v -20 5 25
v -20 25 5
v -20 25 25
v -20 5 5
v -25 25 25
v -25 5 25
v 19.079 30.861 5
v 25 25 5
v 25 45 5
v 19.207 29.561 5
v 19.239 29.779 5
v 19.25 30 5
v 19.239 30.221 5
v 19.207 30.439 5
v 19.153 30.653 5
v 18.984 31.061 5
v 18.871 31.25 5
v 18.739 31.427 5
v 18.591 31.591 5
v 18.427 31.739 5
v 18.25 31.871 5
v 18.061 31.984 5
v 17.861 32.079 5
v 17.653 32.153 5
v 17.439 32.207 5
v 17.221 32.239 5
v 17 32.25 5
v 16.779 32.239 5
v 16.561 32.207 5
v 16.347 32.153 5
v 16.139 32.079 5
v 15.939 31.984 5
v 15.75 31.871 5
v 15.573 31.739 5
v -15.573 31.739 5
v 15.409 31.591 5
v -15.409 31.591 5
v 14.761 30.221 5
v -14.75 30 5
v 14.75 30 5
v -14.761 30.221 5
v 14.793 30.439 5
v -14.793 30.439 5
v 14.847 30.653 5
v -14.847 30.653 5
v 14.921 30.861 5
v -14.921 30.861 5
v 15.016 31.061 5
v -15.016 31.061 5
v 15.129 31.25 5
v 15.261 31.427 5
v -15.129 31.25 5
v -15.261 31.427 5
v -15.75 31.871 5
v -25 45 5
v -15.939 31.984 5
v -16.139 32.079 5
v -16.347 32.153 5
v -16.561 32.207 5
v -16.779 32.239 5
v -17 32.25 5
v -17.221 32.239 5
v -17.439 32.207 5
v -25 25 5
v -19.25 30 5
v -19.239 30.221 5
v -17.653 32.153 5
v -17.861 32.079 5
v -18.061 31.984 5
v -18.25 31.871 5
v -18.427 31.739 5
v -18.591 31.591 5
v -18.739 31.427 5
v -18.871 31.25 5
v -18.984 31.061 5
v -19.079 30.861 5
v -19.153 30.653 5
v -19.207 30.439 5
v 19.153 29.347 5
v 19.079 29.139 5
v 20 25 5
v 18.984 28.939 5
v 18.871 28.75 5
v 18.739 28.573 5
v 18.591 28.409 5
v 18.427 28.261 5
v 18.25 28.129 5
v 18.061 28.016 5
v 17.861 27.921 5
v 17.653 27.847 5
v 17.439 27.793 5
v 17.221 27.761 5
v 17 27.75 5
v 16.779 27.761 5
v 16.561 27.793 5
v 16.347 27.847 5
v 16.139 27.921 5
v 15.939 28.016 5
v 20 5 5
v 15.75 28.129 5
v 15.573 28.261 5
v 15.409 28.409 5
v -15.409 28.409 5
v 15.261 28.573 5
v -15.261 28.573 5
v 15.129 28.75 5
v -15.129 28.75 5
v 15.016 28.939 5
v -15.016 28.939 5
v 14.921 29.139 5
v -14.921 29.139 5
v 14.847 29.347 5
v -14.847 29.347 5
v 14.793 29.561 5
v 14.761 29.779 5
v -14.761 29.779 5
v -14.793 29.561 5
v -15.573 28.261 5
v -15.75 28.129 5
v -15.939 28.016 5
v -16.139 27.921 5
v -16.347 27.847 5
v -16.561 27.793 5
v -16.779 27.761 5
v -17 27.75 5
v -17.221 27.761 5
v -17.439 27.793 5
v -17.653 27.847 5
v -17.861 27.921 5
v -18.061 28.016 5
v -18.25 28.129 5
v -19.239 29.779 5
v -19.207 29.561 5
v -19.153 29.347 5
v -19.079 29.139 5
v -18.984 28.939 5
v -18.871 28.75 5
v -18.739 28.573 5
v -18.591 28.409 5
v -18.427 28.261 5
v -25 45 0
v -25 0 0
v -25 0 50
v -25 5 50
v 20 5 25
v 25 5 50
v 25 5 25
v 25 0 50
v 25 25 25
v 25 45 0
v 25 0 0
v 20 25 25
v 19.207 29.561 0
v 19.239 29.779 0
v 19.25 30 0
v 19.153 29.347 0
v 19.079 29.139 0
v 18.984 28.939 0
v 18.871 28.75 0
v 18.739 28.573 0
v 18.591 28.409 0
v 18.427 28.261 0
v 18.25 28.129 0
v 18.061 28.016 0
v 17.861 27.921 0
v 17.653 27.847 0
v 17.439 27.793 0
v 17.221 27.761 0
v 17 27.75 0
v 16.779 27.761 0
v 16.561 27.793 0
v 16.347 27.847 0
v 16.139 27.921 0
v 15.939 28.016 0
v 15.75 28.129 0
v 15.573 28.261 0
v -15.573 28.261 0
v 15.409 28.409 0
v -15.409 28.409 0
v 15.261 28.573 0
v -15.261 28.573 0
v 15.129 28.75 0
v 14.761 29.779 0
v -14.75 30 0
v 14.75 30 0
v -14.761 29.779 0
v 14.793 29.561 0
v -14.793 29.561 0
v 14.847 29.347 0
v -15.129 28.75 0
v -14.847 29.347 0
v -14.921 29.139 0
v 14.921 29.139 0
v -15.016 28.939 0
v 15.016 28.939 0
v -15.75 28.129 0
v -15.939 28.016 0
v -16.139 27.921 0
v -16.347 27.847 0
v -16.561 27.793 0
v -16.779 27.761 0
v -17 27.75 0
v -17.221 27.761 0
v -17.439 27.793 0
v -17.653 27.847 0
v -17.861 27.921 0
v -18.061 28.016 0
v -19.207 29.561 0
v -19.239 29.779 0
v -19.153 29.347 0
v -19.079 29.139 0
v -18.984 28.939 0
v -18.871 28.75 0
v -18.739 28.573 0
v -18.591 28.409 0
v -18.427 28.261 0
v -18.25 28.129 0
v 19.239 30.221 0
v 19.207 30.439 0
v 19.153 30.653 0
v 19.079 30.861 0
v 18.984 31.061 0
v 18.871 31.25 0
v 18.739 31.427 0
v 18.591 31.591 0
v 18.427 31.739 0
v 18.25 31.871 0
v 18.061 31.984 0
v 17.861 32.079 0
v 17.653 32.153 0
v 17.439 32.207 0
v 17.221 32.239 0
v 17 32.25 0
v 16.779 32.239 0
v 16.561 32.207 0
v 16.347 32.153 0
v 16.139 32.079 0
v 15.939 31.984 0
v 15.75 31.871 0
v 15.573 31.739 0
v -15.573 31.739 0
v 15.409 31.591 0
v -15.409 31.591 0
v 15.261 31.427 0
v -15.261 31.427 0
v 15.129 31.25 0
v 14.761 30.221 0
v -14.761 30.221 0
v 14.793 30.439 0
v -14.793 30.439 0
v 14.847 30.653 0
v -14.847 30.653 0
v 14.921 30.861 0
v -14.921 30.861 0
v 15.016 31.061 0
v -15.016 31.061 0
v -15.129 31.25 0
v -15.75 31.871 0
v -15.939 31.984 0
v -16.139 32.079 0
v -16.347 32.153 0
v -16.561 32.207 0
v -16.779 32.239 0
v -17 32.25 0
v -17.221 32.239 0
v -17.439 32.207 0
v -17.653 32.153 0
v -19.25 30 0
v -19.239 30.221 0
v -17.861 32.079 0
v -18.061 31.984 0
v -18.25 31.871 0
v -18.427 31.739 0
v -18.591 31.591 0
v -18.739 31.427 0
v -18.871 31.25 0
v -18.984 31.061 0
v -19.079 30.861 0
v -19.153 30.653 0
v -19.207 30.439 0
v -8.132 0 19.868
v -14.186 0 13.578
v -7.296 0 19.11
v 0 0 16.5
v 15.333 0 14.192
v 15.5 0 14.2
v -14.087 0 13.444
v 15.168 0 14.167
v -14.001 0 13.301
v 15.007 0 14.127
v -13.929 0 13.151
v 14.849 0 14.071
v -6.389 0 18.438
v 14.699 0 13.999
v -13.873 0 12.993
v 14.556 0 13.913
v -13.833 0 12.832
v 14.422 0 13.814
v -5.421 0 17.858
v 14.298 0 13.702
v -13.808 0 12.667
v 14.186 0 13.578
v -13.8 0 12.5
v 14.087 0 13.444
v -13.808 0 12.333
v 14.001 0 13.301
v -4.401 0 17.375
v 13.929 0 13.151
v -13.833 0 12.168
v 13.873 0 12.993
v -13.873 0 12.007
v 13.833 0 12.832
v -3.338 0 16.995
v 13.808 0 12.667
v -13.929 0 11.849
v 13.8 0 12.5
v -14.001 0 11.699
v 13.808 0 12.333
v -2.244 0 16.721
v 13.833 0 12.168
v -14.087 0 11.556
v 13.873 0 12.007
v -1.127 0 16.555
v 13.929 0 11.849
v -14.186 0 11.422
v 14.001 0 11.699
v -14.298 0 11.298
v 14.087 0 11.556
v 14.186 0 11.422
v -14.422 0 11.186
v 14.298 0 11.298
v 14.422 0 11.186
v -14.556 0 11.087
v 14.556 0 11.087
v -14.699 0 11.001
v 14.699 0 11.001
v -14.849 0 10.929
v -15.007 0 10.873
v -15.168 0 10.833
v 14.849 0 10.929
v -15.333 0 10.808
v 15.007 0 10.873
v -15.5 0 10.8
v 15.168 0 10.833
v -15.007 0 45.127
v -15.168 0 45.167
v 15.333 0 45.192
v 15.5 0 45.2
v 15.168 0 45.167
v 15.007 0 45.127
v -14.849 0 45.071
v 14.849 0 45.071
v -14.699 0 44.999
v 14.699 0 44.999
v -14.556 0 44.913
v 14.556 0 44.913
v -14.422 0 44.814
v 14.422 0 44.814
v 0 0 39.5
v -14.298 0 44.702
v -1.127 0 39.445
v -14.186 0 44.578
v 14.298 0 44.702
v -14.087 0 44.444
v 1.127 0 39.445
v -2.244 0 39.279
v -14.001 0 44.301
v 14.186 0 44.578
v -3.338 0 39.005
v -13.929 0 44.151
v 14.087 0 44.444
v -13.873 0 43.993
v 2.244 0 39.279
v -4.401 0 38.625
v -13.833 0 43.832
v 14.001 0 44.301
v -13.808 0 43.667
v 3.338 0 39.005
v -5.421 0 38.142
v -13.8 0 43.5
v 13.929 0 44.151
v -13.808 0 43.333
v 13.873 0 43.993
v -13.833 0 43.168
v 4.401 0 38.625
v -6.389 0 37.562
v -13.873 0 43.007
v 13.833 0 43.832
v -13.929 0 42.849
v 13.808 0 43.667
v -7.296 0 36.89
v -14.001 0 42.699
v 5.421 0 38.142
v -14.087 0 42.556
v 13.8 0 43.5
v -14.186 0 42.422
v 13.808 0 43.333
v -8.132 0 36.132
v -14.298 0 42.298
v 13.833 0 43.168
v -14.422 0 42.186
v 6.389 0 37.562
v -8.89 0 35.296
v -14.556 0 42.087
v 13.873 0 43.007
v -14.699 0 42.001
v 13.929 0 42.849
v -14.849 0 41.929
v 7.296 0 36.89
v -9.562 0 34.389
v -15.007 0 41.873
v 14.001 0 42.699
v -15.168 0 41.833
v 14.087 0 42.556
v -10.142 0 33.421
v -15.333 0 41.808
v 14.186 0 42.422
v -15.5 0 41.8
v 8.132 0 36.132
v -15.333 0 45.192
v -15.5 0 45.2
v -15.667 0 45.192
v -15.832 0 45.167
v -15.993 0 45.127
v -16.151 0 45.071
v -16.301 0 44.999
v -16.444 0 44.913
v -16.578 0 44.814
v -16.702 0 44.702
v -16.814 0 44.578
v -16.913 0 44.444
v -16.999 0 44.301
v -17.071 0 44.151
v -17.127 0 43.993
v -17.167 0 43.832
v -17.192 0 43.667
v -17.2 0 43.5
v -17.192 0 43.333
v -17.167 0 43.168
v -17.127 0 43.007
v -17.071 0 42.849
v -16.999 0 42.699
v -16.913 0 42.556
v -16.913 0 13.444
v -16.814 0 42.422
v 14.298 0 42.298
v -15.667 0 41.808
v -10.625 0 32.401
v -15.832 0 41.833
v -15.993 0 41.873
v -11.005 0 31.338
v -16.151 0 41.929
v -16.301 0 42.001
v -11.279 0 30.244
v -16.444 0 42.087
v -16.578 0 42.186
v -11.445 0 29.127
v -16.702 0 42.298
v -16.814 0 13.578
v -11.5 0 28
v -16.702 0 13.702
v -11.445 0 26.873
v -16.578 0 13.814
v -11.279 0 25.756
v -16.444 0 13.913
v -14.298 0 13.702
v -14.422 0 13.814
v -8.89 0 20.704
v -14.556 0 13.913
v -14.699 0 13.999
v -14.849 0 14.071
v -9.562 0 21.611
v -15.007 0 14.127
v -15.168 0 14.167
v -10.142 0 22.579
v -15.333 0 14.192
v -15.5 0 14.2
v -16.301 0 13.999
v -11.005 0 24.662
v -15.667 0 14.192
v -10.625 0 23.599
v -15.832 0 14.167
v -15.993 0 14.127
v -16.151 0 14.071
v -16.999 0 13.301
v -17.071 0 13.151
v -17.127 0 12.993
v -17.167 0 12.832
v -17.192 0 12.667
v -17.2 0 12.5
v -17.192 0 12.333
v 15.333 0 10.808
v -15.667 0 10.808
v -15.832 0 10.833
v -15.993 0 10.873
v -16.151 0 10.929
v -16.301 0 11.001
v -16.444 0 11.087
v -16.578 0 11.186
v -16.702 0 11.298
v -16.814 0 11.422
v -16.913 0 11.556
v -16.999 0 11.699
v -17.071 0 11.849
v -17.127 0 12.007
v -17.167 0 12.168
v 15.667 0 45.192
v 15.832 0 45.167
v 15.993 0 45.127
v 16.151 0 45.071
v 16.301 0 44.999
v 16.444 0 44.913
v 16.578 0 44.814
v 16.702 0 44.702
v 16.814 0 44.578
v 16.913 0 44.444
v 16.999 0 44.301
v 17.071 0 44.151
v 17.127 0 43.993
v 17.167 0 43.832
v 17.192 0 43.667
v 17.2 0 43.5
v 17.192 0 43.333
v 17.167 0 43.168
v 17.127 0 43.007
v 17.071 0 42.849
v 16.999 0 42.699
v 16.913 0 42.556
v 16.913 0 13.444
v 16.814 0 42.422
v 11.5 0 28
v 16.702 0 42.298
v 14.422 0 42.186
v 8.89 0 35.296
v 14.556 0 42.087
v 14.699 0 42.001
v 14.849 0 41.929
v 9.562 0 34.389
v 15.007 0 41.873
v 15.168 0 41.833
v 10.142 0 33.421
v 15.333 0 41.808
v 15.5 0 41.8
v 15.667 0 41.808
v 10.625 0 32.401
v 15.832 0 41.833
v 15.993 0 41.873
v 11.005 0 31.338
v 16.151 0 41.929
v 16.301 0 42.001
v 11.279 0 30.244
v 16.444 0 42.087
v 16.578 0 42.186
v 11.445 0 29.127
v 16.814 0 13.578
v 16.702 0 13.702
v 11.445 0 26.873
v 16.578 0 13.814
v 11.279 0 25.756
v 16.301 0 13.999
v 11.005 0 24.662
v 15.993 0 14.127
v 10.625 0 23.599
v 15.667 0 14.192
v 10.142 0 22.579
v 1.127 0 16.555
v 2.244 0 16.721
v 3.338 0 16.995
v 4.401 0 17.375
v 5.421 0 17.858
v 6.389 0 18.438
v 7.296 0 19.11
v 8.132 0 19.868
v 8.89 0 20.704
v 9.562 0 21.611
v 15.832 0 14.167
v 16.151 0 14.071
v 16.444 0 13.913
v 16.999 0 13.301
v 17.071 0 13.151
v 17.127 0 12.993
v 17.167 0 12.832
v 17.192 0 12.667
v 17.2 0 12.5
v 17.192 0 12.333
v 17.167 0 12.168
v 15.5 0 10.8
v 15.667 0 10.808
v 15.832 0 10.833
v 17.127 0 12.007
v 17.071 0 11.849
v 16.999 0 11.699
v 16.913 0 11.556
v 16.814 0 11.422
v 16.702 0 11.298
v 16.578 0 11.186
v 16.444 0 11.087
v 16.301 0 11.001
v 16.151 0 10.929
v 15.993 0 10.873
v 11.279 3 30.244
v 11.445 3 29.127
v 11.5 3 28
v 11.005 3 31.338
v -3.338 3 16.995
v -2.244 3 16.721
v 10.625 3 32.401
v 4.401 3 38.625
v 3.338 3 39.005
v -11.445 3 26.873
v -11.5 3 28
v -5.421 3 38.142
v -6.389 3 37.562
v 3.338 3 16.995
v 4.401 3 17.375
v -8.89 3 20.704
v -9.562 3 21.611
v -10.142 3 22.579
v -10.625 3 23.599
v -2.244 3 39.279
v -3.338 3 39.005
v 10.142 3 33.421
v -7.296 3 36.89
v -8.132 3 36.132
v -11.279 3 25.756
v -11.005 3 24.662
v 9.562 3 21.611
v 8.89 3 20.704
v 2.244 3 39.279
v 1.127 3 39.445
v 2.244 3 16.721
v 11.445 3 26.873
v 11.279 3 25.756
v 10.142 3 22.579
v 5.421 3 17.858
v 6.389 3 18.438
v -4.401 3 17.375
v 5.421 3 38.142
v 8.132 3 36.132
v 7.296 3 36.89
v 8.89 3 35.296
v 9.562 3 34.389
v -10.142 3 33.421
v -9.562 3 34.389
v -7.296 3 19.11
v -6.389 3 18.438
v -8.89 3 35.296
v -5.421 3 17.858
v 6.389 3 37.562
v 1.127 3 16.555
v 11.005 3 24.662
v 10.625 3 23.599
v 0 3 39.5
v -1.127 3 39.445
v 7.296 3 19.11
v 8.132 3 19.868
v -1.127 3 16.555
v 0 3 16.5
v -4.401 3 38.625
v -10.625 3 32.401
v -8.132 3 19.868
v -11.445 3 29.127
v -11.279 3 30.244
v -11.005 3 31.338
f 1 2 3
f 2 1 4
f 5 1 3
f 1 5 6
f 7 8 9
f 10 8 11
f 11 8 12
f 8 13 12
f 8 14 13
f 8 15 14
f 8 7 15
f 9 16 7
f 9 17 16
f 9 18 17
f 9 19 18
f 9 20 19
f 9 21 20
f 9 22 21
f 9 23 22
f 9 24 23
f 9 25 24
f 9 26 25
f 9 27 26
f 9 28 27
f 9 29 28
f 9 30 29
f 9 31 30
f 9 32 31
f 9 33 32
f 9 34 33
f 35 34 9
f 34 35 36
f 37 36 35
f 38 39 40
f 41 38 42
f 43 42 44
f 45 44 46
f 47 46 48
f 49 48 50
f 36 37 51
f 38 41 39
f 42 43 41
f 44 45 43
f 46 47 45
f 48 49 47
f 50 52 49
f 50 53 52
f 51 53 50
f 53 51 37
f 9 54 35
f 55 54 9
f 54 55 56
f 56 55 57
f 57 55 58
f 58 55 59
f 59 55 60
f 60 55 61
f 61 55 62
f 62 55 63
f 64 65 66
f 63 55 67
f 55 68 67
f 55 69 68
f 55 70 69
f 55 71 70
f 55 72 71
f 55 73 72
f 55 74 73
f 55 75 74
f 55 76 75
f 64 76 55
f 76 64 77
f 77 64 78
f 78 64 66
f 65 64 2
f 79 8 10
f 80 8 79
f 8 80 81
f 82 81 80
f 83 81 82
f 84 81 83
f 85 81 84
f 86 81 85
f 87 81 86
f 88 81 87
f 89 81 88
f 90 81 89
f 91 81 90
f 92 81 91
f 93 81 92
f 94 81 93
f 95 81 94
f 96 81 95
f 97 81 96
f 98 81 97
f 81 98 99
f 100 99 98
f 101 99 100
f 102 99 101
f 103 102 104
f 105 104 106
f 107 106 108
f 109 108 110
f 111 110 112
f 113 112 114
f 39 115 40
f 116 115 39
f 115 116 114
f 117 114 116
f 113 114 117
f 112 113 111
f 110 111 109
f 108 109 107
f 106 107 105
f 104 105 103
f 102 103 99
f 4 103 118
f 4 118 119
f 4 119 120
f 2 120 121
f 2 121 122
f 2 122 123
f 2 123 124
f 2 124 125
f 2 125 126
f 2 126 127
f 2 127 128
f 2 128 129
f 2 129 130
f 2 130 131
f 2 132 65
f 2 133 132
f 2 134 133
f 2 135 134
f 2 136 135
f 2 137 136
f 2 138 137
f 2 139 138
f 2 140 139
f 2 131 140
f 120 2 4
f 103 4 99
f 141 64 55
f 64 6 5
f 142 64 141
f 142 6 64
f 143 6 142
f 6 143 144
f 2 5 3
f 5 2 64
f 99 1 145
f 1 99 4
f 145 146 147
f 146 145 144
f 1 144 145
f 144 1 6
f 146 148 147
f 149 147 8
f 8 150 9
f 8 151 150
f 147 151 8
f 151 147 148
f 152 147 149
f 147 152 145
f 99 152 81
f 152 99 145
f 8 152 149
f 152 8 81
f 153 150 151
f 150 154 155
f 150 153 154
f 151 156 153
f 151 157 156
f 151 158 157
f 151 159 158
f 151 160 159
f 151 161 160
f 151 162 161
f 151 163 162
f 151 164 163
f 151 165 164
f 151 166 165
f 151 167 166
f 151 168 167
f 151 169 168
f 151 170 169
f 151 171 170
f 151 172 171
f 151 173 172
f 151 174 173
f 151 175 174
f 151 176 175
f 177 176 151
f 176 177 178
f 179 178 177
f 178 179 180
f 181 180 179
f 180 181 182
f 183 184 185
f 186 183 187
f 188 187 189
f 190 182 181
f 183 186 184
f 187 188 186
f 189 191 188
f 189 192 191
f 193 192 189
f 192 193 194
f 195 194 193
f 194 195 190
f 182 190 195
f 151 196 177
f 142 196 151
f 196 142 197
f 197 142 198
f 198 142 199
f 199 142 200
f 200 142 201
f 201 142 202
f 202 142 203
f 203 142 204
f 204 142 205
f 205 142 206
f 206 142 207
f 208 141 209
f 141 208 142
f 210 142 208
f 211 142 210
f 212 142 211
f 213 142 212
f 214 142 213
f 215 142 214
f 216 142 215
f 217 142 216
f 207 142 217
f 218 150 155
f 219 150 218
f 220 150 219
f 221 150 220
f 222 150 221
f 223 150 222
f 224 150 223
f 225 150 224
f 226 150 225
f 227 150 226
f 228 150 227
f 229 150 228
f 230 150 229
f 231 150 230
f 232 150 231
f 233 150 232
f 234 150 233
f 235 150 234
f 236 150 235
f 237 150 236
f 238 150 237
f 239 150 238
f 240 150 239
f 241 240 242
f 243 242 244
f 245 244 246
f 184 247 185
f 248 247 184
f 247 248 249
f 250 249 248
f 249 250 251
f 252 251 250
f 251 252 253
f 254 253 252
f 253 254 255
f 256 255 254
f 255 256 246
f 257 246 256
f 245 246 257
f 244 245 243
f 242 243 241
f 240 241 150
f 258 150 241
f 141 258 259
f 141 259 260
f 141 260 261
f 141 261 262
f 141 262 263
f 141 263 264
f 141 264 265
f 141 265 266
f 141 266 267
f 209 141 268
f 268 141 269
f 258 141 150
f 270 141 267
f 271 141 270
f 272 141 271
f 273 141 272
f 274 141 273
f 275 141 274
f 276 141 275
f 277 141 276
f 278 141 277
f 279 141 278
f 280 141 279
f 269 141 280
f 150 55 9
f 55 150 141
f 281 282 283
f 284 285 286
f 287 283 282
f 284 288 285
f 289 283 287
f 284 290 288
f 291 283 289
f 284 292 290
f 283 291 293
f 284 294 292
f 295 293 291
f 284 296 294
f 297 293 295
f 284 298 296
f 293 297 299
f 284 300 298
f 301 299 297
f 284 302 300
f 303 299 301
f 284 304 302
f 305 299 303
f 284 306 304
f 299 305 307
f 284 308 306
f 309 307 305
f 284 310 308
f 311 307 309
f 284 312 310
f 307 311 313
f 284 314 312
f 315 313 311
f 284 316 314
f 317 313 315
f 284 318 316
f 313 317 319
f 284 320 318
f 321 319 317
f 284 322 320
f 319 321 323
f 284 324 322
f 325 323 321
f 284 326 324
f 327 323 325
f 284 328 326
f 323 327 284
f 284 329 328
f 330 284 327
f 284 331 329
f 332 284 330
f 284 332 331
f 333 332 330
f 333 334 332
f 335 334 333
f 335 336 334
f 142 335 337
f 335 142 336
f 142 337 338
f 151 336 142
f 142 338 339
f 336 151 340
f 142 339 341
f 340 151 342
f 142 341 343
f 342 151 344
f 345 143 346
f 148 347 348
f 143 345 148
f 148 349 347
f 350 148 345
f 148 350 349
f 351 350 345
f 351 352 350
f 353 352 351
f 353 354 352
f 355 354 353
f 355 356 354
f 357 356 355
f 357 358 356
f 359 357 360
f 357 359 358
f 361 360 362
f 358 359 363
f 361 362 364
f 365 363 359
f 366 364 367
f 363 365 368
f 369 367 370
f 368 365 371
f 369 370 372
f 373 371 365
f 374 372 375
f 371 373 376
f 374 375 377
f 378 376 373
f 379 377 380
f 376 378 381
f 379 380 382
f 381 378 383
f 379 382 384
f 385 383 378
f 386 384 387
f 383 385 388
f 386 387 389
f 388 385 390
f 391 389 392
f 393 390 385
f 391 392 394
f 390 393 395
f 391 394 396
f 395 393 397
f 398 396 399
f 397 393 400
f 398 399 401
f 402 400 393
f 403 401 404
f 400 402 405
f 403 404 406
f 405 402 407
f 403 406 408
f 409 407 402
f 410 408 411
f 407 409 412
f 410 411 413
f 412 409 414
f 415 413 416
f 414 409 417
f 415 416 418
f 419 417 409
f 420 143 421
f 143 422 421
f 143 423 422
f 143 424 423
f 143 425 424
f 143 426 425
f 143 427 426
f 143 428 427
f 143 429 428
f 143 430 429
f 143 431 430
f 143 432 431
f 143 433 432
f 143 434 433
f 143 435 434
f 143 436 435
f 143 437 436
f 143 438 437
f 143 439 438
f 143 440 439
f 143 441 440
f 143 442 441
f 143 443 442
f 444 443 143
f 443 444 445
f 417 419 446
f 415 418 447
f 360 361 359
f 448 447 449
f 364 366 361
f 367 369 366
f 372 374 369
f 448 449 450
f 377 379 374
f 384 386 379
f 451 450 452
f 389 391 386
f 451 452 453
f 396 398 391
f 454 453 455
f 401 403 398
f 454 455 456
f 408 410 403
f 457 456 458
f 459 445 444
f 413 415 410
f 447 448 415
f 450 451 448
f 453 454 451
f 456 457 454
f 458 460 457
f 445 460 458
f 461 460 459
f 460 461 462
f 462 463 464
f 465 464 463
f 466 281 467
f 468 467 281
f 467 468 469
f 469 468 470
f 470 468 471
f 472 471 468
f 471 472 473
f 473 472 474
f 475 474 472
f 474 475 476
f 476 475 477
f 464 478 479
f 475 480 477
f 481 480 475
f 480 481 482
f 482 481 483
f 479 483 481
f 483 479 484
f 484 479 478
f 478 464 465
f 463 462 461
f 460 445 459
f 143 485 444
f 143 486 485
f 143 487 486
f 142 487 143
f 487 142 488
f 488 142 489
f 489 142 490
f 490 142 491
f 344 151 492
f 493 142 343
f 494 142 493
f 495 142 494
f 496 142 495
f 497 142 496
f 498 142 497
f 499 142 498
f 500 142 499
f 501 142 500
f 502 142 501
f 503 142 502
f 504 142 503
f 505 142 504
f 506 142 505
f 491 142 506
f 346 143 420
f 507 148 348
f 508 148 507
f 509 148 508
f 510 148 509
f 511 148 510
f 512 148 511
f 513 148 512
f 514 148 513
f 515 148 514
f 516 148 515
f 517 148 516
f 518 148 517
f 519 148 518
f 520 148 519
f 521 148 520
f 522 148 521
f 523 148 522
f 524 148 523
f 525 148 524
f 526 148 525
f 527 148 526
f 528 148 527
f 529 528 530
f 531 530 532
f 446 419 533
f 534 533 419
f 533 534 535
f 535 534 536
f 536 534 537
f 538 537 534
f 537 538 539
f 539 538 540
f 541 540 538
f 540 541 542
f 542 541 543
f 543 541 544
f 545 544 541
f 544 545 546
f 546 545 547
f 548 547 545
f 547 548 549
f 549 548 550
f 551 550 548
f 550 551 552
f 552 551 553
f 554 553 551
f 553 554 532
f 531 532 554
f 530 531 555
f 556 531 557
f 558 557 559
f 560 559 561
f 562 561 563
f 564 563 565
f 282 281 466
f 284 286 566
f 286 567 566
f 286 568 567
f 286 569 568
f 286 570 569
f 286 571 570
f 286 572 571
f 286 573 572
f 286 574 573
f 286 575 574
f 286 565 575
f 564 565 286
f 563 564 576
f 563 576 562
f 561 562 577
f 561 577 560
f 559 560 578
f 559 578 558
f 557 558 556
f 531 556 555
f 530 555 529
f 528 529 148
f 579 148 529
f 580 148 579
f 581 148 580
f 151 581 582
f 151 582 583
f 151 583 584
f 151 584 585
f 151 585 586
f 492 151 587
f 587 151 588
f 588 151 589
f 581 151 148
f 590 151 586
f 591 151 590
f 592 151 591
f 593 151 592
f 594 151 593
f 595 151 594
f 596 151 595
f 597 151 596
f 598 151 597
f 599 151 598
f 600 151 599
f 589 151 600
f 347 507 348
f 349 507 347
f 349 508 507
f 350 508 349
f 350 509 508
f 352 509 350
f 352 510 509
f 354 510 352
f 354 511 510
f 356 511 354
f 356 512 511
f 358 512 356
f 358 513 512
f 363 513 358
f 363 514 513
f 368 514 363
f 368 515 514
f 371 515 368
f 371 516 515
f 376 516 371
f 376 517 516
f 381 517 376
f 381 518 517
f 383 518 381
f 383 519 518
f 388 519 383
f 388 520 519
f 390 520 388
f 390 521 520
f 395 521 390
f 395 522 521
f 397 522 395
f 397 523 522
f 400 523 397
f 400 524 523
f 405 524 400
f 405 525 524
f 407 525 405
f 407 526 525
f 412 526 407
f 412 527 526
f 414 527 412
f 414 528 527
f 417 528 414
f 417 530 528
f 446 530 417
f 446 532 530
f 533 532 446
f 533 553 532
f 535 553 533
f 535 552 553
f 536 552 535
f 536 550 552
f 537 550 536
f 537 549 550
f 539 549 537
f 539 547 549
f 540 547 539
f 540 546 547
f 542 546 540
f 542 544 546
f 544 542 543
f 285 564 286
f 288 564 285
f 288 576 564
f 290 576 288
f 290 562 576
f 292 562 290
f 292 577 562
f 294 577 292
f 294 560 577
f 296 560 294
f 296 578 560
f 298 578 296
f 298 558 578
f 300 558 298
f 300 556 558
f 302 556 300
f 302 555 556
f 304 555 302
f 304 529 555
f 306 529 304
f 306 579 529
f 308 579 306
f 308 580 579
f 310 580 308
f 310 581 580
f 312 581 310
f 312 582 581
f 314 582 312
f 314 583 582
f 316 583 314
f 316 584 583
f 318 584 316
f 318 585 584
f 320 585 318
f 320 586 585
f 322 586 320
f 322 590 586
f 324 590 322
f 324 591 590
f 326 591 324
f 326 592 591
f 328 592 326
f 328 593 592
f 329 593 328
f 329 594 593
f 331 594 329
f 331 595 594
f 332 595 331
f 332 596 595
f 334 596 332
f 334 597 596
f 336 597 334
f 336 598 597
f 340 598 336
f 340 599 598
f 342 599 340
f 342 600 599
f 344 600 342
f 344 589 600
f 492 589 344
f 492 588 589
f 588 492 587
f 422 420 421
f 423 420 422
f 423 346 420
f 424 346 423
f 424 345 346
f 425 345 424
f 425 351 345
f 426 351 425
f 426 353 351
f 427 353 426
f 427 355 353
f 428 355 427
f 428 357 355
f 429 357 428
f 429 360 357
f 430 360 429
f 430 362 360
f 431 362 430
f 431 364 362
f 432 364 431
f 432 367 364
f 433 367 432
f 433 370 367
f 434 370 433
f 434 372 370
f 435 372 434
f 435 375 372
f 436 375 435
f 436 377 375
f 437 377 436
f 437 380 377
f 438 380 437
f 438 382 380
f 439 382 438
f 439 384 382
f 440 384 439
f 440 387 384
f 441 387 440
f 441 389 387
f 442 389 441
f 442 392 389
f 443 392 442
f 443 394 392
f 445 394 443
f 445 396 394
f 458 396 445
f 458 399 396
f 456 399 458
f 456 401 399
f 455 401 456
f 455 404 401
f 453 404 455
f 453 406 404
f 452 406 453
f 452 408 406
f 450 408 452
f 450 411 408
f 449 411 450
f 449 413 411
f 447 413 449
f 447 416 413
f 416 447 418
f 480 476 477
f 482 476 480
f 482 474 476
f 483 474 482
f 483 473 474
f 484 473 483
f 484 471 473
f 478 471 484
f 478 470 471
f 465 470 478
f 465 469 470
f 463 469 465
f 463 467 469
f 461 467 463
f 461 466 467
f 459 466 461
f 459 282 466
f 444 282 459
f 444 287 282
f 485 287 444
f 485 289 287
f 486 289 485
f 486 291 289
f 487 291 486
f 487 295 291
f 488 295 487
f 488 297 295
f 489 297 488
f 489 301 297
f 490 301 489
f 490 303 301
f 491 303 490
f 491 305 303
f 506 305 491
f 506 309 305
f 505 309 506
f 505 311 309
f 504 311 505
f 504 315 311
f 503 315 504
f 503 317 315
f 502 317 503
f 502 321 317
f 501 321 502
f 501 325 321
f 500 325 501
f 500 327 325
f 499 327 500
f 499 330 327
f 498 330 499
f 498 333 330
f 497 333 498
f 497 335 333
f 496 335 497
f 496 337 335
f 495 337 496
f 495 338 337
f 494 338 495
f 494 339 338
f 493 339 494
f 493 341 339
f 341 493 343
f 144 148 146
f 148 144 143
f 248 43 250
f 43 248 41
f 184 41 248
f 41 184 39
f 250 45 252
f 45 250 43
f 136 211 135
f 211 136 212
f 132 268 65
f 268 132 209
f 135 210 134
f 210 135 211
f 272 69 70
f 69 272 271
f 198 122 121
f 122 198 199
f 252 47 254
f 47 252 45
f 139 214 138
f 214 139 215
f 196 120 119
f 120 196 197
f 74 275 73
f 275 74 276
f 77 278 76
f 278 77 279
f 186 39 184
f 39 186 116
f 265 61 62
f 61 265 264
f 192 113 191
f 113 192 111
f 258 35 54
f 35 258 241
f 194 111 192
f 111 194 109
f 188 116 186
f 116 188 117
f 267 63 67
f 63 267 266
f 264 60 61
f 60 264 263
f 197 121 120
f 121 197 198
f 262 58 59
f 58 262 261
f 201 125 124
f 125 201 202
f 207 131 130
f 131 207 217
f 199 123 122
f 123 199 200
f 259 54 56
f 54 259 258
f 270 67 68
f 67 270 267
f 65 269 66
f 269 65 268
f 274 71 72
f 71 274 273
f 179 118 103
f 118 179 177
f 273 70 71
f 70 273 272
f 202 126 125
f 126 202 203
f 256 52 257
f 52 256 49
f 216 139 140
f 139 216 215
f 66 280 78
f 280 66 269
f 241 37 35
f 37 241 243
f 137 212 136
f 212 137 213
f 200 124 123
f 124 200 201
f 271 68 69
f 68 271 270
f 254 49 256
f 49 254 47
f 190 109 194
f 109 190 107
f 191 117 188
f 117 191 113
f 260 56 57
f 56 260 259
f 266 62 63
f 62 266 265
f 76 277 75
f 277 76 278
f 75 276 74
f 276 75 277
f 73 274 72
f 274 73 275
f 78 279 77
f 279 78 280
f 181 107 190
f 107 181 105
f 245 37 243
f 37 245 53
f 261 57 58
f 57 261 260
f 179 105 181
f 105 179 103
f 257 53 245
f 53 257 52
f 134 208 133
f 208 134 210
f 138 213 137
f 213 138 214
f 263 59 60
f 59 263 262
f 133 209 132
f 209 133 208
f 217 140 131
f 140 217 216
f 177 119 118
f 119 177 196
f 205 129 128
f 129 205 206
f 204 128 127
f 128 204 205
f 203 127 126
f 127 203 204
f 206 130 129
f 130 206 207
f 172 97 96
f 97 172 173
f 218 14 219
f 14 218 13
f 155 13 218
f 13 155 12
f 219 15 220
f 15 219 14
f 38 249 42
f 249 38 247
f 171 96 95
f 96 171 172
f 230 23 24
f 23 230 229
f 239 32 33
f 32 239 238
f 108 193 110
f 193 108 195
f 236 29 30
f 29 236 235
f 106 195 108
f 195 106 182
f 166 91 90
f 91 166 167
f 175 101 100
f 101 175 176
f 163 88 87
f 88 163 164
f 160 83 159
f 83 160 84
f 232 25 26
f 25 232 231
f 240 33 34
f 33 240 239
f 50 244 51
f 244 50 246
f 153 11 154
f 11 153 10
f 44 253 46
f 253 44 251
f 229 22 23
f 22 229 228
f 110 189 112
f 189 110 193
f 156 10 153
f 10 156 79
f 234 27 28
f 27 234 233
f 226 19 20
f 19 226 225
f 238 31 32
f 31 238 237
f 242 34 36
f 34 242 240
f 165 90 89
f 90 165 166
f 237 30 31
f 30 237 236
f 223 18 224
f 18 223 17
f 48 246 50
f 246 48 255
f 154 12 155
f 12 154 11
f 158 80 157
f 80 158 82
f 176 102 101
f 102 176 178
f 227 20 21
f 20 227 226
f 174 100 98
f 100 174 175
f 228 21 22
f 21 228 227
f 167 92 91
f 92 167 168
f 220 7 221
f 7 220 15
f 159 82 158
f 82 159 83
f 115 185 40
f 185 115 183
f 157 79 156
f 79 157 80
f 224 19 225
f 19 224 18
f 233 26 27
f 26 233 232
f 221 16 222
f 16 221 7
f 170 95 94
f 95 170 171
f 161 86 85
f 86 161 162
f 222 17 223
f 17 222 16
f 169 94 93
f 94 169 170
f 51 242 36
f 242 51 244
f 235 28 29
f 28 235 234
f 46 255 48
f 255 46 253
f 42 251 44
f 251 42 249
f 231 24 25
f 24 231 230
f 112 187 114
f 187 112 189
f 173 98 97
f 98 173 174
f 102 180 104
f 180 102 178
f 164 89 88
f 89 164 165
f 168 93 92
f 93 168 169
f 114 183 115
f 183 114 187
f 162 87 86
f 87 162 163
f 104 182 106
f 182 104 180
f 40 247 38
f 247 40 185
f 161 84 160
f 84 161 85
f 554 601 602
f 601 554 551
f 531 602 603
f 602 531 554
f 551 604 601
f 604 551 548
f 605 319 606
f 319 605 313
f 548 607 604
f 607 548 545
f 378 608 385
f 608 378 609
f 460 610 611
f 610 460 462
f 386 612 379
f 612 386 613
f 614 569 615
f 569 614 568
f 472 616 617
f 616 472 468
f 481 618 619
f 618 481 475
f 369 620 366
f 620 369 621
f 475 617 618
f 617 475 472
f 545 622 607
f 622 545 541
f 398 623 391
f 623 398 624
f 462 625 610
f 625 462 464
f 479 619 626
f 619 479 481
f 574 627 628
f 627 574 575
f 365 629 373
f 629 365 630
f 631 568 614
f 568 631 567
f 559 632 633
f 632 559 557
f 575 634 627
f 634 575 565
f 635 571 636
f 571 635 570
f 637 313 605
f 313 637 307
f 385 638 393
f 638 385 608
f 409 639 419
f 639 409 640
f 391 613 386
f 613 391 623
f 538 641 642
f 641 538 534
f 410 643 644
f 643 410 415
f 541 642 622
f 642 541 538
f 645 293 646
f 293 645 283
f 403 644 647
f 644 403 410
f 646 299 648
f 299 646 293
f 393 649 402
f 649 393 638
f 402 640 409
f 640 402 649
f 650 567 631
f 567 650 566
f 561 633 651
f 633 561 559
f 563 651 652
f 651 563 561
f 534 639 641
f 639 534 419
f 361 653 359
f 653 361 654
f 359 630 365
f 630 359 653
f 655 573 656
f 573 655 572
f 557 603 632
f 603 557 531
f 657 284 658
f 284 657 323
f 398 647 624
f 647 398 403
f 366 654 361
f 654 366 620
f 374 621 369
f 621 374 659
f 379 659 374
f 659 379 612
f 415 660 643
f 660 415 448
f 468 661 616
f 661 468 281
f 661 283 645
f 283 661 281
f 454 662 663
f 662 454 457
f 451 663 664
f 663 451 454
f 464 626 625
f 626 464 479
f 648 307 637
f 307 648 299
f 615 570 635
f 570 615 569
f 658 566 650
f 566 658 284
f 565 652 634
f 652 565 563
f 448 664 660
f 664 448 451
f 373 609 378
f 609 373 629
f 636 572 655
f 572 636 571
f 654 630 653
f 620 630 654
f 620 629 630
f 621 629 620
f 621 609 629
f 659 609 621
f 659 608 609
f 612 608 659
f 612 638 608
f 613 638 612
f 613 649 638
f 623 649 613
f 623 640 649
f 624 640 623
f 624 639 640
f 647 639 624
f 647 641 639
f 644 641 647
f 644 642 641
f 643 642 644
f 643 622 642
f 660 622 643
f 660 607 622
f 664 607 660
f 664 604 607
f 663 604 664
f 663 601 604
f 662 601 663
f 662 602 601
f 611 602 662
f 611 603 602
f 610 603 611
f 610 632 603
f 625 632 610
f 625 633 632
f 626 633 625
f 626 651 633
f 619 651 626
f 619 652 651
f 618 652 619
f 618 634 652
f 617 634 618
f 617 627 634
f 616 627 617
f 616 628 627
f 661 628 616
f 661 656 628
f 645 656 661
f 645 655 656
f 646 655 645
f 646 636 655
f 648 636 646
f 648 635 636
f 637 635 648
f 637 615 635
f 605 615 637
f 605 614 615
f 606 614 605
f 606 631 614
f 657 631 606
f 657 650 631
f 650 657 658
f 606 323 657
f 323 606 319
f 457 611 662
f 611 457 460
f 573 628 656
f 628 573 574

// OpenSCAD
// L-shaped mounting bracket for NEMA 17 stepper motor
// Print orientation: base plate on bed (z = 0), motor plate builds upward (+Z)
// Positioned per user coordinates (x -25 to 25, y 0 to 45), not centred

// ---------- Parameters ----------
base_x_len    = 50;    // base plate length along X
base_y_len    = 45;    // base plate depth along Y
base_t        = 5;     // base plate thickness (Z)

hole_m4_x     = 17;    // M4 hole offset from centre in X (+/-)
hole_m4_y     = 30;    // M4 hole position along Y
hole_m4_d     = 4.5;   // M4 hole diameter

motor_x_len   = 50;    // motor plate length along X
motor_y_len   = 5;     // motor plate thickness (along Y)
motor_h       = 50;    // motor plate height (Z)

boss_d        = 23;    // motor centring boss hole diameter
boss_x        = 0;     // boss hole X position
boss_z        = 28;    // boss hole Z position

screw_d       = 3.4;   // M3 screw hole diameter
screw_pitch   = 31;    // square pattern side length for screws
screw_h       = 10;    // depth of screw holes from motor plate top

gusset_t      = 5;     // gusset thickness (along X)
gusset_leg    = 20;    // right triangle leg length (along Y and Z)

eps           = 0.5;   // cutter overshoot past faces

$fn = 64;

// ---------- Model ----------
difference() {
    union() {
        // Base plate
        translate([-base_x_len/2, 0, 0])
            cube([base_x_len, base_y_len, base_t]);

        // Motor plate, standing on back edge of base
        translate([-motor_x_len/2, 0, 0])
            cube([motor_x_len, motor_y_len, motor_h]);

        // Gussets, flush with left and right edges
        for (sx = [-1, 1])
            translate([sx > 0 ? 20 : -25, motor_y_len, base_t])
                cube([gusset_t, gusset_leg, gusset_leg]);
    }

    // M4 through-holes in base plate
    for (x = [-hole_m4_x, hole_m4_x])
        translate([x, hole_m4_y, -eps])
            cylinder(d = hole_m4_d, h = base_t + 2*eps);

    // Motor boss hole through motor plate (along Y)
    translate([boss_x, 0, boss_z])
        rotate([90, 0, 0])
            cylinder(d = boss_d, h = motor_y_len + 2*eps, center = true);

    // M3 screw holes on square pattern, centred on boss hole
    for (i = [0 : 3]) {
        for (j = [0 : 3]) {
            x = (i - 1.5) * screw_pitch;
            z = (j - 1.5) * screw_pitch;
            translate([x, 0, boss_z + z])
                rotate([90, 0, 0])
                    cylinder(d = screw_d, h = screw_h + eps);
        }
    }
}
